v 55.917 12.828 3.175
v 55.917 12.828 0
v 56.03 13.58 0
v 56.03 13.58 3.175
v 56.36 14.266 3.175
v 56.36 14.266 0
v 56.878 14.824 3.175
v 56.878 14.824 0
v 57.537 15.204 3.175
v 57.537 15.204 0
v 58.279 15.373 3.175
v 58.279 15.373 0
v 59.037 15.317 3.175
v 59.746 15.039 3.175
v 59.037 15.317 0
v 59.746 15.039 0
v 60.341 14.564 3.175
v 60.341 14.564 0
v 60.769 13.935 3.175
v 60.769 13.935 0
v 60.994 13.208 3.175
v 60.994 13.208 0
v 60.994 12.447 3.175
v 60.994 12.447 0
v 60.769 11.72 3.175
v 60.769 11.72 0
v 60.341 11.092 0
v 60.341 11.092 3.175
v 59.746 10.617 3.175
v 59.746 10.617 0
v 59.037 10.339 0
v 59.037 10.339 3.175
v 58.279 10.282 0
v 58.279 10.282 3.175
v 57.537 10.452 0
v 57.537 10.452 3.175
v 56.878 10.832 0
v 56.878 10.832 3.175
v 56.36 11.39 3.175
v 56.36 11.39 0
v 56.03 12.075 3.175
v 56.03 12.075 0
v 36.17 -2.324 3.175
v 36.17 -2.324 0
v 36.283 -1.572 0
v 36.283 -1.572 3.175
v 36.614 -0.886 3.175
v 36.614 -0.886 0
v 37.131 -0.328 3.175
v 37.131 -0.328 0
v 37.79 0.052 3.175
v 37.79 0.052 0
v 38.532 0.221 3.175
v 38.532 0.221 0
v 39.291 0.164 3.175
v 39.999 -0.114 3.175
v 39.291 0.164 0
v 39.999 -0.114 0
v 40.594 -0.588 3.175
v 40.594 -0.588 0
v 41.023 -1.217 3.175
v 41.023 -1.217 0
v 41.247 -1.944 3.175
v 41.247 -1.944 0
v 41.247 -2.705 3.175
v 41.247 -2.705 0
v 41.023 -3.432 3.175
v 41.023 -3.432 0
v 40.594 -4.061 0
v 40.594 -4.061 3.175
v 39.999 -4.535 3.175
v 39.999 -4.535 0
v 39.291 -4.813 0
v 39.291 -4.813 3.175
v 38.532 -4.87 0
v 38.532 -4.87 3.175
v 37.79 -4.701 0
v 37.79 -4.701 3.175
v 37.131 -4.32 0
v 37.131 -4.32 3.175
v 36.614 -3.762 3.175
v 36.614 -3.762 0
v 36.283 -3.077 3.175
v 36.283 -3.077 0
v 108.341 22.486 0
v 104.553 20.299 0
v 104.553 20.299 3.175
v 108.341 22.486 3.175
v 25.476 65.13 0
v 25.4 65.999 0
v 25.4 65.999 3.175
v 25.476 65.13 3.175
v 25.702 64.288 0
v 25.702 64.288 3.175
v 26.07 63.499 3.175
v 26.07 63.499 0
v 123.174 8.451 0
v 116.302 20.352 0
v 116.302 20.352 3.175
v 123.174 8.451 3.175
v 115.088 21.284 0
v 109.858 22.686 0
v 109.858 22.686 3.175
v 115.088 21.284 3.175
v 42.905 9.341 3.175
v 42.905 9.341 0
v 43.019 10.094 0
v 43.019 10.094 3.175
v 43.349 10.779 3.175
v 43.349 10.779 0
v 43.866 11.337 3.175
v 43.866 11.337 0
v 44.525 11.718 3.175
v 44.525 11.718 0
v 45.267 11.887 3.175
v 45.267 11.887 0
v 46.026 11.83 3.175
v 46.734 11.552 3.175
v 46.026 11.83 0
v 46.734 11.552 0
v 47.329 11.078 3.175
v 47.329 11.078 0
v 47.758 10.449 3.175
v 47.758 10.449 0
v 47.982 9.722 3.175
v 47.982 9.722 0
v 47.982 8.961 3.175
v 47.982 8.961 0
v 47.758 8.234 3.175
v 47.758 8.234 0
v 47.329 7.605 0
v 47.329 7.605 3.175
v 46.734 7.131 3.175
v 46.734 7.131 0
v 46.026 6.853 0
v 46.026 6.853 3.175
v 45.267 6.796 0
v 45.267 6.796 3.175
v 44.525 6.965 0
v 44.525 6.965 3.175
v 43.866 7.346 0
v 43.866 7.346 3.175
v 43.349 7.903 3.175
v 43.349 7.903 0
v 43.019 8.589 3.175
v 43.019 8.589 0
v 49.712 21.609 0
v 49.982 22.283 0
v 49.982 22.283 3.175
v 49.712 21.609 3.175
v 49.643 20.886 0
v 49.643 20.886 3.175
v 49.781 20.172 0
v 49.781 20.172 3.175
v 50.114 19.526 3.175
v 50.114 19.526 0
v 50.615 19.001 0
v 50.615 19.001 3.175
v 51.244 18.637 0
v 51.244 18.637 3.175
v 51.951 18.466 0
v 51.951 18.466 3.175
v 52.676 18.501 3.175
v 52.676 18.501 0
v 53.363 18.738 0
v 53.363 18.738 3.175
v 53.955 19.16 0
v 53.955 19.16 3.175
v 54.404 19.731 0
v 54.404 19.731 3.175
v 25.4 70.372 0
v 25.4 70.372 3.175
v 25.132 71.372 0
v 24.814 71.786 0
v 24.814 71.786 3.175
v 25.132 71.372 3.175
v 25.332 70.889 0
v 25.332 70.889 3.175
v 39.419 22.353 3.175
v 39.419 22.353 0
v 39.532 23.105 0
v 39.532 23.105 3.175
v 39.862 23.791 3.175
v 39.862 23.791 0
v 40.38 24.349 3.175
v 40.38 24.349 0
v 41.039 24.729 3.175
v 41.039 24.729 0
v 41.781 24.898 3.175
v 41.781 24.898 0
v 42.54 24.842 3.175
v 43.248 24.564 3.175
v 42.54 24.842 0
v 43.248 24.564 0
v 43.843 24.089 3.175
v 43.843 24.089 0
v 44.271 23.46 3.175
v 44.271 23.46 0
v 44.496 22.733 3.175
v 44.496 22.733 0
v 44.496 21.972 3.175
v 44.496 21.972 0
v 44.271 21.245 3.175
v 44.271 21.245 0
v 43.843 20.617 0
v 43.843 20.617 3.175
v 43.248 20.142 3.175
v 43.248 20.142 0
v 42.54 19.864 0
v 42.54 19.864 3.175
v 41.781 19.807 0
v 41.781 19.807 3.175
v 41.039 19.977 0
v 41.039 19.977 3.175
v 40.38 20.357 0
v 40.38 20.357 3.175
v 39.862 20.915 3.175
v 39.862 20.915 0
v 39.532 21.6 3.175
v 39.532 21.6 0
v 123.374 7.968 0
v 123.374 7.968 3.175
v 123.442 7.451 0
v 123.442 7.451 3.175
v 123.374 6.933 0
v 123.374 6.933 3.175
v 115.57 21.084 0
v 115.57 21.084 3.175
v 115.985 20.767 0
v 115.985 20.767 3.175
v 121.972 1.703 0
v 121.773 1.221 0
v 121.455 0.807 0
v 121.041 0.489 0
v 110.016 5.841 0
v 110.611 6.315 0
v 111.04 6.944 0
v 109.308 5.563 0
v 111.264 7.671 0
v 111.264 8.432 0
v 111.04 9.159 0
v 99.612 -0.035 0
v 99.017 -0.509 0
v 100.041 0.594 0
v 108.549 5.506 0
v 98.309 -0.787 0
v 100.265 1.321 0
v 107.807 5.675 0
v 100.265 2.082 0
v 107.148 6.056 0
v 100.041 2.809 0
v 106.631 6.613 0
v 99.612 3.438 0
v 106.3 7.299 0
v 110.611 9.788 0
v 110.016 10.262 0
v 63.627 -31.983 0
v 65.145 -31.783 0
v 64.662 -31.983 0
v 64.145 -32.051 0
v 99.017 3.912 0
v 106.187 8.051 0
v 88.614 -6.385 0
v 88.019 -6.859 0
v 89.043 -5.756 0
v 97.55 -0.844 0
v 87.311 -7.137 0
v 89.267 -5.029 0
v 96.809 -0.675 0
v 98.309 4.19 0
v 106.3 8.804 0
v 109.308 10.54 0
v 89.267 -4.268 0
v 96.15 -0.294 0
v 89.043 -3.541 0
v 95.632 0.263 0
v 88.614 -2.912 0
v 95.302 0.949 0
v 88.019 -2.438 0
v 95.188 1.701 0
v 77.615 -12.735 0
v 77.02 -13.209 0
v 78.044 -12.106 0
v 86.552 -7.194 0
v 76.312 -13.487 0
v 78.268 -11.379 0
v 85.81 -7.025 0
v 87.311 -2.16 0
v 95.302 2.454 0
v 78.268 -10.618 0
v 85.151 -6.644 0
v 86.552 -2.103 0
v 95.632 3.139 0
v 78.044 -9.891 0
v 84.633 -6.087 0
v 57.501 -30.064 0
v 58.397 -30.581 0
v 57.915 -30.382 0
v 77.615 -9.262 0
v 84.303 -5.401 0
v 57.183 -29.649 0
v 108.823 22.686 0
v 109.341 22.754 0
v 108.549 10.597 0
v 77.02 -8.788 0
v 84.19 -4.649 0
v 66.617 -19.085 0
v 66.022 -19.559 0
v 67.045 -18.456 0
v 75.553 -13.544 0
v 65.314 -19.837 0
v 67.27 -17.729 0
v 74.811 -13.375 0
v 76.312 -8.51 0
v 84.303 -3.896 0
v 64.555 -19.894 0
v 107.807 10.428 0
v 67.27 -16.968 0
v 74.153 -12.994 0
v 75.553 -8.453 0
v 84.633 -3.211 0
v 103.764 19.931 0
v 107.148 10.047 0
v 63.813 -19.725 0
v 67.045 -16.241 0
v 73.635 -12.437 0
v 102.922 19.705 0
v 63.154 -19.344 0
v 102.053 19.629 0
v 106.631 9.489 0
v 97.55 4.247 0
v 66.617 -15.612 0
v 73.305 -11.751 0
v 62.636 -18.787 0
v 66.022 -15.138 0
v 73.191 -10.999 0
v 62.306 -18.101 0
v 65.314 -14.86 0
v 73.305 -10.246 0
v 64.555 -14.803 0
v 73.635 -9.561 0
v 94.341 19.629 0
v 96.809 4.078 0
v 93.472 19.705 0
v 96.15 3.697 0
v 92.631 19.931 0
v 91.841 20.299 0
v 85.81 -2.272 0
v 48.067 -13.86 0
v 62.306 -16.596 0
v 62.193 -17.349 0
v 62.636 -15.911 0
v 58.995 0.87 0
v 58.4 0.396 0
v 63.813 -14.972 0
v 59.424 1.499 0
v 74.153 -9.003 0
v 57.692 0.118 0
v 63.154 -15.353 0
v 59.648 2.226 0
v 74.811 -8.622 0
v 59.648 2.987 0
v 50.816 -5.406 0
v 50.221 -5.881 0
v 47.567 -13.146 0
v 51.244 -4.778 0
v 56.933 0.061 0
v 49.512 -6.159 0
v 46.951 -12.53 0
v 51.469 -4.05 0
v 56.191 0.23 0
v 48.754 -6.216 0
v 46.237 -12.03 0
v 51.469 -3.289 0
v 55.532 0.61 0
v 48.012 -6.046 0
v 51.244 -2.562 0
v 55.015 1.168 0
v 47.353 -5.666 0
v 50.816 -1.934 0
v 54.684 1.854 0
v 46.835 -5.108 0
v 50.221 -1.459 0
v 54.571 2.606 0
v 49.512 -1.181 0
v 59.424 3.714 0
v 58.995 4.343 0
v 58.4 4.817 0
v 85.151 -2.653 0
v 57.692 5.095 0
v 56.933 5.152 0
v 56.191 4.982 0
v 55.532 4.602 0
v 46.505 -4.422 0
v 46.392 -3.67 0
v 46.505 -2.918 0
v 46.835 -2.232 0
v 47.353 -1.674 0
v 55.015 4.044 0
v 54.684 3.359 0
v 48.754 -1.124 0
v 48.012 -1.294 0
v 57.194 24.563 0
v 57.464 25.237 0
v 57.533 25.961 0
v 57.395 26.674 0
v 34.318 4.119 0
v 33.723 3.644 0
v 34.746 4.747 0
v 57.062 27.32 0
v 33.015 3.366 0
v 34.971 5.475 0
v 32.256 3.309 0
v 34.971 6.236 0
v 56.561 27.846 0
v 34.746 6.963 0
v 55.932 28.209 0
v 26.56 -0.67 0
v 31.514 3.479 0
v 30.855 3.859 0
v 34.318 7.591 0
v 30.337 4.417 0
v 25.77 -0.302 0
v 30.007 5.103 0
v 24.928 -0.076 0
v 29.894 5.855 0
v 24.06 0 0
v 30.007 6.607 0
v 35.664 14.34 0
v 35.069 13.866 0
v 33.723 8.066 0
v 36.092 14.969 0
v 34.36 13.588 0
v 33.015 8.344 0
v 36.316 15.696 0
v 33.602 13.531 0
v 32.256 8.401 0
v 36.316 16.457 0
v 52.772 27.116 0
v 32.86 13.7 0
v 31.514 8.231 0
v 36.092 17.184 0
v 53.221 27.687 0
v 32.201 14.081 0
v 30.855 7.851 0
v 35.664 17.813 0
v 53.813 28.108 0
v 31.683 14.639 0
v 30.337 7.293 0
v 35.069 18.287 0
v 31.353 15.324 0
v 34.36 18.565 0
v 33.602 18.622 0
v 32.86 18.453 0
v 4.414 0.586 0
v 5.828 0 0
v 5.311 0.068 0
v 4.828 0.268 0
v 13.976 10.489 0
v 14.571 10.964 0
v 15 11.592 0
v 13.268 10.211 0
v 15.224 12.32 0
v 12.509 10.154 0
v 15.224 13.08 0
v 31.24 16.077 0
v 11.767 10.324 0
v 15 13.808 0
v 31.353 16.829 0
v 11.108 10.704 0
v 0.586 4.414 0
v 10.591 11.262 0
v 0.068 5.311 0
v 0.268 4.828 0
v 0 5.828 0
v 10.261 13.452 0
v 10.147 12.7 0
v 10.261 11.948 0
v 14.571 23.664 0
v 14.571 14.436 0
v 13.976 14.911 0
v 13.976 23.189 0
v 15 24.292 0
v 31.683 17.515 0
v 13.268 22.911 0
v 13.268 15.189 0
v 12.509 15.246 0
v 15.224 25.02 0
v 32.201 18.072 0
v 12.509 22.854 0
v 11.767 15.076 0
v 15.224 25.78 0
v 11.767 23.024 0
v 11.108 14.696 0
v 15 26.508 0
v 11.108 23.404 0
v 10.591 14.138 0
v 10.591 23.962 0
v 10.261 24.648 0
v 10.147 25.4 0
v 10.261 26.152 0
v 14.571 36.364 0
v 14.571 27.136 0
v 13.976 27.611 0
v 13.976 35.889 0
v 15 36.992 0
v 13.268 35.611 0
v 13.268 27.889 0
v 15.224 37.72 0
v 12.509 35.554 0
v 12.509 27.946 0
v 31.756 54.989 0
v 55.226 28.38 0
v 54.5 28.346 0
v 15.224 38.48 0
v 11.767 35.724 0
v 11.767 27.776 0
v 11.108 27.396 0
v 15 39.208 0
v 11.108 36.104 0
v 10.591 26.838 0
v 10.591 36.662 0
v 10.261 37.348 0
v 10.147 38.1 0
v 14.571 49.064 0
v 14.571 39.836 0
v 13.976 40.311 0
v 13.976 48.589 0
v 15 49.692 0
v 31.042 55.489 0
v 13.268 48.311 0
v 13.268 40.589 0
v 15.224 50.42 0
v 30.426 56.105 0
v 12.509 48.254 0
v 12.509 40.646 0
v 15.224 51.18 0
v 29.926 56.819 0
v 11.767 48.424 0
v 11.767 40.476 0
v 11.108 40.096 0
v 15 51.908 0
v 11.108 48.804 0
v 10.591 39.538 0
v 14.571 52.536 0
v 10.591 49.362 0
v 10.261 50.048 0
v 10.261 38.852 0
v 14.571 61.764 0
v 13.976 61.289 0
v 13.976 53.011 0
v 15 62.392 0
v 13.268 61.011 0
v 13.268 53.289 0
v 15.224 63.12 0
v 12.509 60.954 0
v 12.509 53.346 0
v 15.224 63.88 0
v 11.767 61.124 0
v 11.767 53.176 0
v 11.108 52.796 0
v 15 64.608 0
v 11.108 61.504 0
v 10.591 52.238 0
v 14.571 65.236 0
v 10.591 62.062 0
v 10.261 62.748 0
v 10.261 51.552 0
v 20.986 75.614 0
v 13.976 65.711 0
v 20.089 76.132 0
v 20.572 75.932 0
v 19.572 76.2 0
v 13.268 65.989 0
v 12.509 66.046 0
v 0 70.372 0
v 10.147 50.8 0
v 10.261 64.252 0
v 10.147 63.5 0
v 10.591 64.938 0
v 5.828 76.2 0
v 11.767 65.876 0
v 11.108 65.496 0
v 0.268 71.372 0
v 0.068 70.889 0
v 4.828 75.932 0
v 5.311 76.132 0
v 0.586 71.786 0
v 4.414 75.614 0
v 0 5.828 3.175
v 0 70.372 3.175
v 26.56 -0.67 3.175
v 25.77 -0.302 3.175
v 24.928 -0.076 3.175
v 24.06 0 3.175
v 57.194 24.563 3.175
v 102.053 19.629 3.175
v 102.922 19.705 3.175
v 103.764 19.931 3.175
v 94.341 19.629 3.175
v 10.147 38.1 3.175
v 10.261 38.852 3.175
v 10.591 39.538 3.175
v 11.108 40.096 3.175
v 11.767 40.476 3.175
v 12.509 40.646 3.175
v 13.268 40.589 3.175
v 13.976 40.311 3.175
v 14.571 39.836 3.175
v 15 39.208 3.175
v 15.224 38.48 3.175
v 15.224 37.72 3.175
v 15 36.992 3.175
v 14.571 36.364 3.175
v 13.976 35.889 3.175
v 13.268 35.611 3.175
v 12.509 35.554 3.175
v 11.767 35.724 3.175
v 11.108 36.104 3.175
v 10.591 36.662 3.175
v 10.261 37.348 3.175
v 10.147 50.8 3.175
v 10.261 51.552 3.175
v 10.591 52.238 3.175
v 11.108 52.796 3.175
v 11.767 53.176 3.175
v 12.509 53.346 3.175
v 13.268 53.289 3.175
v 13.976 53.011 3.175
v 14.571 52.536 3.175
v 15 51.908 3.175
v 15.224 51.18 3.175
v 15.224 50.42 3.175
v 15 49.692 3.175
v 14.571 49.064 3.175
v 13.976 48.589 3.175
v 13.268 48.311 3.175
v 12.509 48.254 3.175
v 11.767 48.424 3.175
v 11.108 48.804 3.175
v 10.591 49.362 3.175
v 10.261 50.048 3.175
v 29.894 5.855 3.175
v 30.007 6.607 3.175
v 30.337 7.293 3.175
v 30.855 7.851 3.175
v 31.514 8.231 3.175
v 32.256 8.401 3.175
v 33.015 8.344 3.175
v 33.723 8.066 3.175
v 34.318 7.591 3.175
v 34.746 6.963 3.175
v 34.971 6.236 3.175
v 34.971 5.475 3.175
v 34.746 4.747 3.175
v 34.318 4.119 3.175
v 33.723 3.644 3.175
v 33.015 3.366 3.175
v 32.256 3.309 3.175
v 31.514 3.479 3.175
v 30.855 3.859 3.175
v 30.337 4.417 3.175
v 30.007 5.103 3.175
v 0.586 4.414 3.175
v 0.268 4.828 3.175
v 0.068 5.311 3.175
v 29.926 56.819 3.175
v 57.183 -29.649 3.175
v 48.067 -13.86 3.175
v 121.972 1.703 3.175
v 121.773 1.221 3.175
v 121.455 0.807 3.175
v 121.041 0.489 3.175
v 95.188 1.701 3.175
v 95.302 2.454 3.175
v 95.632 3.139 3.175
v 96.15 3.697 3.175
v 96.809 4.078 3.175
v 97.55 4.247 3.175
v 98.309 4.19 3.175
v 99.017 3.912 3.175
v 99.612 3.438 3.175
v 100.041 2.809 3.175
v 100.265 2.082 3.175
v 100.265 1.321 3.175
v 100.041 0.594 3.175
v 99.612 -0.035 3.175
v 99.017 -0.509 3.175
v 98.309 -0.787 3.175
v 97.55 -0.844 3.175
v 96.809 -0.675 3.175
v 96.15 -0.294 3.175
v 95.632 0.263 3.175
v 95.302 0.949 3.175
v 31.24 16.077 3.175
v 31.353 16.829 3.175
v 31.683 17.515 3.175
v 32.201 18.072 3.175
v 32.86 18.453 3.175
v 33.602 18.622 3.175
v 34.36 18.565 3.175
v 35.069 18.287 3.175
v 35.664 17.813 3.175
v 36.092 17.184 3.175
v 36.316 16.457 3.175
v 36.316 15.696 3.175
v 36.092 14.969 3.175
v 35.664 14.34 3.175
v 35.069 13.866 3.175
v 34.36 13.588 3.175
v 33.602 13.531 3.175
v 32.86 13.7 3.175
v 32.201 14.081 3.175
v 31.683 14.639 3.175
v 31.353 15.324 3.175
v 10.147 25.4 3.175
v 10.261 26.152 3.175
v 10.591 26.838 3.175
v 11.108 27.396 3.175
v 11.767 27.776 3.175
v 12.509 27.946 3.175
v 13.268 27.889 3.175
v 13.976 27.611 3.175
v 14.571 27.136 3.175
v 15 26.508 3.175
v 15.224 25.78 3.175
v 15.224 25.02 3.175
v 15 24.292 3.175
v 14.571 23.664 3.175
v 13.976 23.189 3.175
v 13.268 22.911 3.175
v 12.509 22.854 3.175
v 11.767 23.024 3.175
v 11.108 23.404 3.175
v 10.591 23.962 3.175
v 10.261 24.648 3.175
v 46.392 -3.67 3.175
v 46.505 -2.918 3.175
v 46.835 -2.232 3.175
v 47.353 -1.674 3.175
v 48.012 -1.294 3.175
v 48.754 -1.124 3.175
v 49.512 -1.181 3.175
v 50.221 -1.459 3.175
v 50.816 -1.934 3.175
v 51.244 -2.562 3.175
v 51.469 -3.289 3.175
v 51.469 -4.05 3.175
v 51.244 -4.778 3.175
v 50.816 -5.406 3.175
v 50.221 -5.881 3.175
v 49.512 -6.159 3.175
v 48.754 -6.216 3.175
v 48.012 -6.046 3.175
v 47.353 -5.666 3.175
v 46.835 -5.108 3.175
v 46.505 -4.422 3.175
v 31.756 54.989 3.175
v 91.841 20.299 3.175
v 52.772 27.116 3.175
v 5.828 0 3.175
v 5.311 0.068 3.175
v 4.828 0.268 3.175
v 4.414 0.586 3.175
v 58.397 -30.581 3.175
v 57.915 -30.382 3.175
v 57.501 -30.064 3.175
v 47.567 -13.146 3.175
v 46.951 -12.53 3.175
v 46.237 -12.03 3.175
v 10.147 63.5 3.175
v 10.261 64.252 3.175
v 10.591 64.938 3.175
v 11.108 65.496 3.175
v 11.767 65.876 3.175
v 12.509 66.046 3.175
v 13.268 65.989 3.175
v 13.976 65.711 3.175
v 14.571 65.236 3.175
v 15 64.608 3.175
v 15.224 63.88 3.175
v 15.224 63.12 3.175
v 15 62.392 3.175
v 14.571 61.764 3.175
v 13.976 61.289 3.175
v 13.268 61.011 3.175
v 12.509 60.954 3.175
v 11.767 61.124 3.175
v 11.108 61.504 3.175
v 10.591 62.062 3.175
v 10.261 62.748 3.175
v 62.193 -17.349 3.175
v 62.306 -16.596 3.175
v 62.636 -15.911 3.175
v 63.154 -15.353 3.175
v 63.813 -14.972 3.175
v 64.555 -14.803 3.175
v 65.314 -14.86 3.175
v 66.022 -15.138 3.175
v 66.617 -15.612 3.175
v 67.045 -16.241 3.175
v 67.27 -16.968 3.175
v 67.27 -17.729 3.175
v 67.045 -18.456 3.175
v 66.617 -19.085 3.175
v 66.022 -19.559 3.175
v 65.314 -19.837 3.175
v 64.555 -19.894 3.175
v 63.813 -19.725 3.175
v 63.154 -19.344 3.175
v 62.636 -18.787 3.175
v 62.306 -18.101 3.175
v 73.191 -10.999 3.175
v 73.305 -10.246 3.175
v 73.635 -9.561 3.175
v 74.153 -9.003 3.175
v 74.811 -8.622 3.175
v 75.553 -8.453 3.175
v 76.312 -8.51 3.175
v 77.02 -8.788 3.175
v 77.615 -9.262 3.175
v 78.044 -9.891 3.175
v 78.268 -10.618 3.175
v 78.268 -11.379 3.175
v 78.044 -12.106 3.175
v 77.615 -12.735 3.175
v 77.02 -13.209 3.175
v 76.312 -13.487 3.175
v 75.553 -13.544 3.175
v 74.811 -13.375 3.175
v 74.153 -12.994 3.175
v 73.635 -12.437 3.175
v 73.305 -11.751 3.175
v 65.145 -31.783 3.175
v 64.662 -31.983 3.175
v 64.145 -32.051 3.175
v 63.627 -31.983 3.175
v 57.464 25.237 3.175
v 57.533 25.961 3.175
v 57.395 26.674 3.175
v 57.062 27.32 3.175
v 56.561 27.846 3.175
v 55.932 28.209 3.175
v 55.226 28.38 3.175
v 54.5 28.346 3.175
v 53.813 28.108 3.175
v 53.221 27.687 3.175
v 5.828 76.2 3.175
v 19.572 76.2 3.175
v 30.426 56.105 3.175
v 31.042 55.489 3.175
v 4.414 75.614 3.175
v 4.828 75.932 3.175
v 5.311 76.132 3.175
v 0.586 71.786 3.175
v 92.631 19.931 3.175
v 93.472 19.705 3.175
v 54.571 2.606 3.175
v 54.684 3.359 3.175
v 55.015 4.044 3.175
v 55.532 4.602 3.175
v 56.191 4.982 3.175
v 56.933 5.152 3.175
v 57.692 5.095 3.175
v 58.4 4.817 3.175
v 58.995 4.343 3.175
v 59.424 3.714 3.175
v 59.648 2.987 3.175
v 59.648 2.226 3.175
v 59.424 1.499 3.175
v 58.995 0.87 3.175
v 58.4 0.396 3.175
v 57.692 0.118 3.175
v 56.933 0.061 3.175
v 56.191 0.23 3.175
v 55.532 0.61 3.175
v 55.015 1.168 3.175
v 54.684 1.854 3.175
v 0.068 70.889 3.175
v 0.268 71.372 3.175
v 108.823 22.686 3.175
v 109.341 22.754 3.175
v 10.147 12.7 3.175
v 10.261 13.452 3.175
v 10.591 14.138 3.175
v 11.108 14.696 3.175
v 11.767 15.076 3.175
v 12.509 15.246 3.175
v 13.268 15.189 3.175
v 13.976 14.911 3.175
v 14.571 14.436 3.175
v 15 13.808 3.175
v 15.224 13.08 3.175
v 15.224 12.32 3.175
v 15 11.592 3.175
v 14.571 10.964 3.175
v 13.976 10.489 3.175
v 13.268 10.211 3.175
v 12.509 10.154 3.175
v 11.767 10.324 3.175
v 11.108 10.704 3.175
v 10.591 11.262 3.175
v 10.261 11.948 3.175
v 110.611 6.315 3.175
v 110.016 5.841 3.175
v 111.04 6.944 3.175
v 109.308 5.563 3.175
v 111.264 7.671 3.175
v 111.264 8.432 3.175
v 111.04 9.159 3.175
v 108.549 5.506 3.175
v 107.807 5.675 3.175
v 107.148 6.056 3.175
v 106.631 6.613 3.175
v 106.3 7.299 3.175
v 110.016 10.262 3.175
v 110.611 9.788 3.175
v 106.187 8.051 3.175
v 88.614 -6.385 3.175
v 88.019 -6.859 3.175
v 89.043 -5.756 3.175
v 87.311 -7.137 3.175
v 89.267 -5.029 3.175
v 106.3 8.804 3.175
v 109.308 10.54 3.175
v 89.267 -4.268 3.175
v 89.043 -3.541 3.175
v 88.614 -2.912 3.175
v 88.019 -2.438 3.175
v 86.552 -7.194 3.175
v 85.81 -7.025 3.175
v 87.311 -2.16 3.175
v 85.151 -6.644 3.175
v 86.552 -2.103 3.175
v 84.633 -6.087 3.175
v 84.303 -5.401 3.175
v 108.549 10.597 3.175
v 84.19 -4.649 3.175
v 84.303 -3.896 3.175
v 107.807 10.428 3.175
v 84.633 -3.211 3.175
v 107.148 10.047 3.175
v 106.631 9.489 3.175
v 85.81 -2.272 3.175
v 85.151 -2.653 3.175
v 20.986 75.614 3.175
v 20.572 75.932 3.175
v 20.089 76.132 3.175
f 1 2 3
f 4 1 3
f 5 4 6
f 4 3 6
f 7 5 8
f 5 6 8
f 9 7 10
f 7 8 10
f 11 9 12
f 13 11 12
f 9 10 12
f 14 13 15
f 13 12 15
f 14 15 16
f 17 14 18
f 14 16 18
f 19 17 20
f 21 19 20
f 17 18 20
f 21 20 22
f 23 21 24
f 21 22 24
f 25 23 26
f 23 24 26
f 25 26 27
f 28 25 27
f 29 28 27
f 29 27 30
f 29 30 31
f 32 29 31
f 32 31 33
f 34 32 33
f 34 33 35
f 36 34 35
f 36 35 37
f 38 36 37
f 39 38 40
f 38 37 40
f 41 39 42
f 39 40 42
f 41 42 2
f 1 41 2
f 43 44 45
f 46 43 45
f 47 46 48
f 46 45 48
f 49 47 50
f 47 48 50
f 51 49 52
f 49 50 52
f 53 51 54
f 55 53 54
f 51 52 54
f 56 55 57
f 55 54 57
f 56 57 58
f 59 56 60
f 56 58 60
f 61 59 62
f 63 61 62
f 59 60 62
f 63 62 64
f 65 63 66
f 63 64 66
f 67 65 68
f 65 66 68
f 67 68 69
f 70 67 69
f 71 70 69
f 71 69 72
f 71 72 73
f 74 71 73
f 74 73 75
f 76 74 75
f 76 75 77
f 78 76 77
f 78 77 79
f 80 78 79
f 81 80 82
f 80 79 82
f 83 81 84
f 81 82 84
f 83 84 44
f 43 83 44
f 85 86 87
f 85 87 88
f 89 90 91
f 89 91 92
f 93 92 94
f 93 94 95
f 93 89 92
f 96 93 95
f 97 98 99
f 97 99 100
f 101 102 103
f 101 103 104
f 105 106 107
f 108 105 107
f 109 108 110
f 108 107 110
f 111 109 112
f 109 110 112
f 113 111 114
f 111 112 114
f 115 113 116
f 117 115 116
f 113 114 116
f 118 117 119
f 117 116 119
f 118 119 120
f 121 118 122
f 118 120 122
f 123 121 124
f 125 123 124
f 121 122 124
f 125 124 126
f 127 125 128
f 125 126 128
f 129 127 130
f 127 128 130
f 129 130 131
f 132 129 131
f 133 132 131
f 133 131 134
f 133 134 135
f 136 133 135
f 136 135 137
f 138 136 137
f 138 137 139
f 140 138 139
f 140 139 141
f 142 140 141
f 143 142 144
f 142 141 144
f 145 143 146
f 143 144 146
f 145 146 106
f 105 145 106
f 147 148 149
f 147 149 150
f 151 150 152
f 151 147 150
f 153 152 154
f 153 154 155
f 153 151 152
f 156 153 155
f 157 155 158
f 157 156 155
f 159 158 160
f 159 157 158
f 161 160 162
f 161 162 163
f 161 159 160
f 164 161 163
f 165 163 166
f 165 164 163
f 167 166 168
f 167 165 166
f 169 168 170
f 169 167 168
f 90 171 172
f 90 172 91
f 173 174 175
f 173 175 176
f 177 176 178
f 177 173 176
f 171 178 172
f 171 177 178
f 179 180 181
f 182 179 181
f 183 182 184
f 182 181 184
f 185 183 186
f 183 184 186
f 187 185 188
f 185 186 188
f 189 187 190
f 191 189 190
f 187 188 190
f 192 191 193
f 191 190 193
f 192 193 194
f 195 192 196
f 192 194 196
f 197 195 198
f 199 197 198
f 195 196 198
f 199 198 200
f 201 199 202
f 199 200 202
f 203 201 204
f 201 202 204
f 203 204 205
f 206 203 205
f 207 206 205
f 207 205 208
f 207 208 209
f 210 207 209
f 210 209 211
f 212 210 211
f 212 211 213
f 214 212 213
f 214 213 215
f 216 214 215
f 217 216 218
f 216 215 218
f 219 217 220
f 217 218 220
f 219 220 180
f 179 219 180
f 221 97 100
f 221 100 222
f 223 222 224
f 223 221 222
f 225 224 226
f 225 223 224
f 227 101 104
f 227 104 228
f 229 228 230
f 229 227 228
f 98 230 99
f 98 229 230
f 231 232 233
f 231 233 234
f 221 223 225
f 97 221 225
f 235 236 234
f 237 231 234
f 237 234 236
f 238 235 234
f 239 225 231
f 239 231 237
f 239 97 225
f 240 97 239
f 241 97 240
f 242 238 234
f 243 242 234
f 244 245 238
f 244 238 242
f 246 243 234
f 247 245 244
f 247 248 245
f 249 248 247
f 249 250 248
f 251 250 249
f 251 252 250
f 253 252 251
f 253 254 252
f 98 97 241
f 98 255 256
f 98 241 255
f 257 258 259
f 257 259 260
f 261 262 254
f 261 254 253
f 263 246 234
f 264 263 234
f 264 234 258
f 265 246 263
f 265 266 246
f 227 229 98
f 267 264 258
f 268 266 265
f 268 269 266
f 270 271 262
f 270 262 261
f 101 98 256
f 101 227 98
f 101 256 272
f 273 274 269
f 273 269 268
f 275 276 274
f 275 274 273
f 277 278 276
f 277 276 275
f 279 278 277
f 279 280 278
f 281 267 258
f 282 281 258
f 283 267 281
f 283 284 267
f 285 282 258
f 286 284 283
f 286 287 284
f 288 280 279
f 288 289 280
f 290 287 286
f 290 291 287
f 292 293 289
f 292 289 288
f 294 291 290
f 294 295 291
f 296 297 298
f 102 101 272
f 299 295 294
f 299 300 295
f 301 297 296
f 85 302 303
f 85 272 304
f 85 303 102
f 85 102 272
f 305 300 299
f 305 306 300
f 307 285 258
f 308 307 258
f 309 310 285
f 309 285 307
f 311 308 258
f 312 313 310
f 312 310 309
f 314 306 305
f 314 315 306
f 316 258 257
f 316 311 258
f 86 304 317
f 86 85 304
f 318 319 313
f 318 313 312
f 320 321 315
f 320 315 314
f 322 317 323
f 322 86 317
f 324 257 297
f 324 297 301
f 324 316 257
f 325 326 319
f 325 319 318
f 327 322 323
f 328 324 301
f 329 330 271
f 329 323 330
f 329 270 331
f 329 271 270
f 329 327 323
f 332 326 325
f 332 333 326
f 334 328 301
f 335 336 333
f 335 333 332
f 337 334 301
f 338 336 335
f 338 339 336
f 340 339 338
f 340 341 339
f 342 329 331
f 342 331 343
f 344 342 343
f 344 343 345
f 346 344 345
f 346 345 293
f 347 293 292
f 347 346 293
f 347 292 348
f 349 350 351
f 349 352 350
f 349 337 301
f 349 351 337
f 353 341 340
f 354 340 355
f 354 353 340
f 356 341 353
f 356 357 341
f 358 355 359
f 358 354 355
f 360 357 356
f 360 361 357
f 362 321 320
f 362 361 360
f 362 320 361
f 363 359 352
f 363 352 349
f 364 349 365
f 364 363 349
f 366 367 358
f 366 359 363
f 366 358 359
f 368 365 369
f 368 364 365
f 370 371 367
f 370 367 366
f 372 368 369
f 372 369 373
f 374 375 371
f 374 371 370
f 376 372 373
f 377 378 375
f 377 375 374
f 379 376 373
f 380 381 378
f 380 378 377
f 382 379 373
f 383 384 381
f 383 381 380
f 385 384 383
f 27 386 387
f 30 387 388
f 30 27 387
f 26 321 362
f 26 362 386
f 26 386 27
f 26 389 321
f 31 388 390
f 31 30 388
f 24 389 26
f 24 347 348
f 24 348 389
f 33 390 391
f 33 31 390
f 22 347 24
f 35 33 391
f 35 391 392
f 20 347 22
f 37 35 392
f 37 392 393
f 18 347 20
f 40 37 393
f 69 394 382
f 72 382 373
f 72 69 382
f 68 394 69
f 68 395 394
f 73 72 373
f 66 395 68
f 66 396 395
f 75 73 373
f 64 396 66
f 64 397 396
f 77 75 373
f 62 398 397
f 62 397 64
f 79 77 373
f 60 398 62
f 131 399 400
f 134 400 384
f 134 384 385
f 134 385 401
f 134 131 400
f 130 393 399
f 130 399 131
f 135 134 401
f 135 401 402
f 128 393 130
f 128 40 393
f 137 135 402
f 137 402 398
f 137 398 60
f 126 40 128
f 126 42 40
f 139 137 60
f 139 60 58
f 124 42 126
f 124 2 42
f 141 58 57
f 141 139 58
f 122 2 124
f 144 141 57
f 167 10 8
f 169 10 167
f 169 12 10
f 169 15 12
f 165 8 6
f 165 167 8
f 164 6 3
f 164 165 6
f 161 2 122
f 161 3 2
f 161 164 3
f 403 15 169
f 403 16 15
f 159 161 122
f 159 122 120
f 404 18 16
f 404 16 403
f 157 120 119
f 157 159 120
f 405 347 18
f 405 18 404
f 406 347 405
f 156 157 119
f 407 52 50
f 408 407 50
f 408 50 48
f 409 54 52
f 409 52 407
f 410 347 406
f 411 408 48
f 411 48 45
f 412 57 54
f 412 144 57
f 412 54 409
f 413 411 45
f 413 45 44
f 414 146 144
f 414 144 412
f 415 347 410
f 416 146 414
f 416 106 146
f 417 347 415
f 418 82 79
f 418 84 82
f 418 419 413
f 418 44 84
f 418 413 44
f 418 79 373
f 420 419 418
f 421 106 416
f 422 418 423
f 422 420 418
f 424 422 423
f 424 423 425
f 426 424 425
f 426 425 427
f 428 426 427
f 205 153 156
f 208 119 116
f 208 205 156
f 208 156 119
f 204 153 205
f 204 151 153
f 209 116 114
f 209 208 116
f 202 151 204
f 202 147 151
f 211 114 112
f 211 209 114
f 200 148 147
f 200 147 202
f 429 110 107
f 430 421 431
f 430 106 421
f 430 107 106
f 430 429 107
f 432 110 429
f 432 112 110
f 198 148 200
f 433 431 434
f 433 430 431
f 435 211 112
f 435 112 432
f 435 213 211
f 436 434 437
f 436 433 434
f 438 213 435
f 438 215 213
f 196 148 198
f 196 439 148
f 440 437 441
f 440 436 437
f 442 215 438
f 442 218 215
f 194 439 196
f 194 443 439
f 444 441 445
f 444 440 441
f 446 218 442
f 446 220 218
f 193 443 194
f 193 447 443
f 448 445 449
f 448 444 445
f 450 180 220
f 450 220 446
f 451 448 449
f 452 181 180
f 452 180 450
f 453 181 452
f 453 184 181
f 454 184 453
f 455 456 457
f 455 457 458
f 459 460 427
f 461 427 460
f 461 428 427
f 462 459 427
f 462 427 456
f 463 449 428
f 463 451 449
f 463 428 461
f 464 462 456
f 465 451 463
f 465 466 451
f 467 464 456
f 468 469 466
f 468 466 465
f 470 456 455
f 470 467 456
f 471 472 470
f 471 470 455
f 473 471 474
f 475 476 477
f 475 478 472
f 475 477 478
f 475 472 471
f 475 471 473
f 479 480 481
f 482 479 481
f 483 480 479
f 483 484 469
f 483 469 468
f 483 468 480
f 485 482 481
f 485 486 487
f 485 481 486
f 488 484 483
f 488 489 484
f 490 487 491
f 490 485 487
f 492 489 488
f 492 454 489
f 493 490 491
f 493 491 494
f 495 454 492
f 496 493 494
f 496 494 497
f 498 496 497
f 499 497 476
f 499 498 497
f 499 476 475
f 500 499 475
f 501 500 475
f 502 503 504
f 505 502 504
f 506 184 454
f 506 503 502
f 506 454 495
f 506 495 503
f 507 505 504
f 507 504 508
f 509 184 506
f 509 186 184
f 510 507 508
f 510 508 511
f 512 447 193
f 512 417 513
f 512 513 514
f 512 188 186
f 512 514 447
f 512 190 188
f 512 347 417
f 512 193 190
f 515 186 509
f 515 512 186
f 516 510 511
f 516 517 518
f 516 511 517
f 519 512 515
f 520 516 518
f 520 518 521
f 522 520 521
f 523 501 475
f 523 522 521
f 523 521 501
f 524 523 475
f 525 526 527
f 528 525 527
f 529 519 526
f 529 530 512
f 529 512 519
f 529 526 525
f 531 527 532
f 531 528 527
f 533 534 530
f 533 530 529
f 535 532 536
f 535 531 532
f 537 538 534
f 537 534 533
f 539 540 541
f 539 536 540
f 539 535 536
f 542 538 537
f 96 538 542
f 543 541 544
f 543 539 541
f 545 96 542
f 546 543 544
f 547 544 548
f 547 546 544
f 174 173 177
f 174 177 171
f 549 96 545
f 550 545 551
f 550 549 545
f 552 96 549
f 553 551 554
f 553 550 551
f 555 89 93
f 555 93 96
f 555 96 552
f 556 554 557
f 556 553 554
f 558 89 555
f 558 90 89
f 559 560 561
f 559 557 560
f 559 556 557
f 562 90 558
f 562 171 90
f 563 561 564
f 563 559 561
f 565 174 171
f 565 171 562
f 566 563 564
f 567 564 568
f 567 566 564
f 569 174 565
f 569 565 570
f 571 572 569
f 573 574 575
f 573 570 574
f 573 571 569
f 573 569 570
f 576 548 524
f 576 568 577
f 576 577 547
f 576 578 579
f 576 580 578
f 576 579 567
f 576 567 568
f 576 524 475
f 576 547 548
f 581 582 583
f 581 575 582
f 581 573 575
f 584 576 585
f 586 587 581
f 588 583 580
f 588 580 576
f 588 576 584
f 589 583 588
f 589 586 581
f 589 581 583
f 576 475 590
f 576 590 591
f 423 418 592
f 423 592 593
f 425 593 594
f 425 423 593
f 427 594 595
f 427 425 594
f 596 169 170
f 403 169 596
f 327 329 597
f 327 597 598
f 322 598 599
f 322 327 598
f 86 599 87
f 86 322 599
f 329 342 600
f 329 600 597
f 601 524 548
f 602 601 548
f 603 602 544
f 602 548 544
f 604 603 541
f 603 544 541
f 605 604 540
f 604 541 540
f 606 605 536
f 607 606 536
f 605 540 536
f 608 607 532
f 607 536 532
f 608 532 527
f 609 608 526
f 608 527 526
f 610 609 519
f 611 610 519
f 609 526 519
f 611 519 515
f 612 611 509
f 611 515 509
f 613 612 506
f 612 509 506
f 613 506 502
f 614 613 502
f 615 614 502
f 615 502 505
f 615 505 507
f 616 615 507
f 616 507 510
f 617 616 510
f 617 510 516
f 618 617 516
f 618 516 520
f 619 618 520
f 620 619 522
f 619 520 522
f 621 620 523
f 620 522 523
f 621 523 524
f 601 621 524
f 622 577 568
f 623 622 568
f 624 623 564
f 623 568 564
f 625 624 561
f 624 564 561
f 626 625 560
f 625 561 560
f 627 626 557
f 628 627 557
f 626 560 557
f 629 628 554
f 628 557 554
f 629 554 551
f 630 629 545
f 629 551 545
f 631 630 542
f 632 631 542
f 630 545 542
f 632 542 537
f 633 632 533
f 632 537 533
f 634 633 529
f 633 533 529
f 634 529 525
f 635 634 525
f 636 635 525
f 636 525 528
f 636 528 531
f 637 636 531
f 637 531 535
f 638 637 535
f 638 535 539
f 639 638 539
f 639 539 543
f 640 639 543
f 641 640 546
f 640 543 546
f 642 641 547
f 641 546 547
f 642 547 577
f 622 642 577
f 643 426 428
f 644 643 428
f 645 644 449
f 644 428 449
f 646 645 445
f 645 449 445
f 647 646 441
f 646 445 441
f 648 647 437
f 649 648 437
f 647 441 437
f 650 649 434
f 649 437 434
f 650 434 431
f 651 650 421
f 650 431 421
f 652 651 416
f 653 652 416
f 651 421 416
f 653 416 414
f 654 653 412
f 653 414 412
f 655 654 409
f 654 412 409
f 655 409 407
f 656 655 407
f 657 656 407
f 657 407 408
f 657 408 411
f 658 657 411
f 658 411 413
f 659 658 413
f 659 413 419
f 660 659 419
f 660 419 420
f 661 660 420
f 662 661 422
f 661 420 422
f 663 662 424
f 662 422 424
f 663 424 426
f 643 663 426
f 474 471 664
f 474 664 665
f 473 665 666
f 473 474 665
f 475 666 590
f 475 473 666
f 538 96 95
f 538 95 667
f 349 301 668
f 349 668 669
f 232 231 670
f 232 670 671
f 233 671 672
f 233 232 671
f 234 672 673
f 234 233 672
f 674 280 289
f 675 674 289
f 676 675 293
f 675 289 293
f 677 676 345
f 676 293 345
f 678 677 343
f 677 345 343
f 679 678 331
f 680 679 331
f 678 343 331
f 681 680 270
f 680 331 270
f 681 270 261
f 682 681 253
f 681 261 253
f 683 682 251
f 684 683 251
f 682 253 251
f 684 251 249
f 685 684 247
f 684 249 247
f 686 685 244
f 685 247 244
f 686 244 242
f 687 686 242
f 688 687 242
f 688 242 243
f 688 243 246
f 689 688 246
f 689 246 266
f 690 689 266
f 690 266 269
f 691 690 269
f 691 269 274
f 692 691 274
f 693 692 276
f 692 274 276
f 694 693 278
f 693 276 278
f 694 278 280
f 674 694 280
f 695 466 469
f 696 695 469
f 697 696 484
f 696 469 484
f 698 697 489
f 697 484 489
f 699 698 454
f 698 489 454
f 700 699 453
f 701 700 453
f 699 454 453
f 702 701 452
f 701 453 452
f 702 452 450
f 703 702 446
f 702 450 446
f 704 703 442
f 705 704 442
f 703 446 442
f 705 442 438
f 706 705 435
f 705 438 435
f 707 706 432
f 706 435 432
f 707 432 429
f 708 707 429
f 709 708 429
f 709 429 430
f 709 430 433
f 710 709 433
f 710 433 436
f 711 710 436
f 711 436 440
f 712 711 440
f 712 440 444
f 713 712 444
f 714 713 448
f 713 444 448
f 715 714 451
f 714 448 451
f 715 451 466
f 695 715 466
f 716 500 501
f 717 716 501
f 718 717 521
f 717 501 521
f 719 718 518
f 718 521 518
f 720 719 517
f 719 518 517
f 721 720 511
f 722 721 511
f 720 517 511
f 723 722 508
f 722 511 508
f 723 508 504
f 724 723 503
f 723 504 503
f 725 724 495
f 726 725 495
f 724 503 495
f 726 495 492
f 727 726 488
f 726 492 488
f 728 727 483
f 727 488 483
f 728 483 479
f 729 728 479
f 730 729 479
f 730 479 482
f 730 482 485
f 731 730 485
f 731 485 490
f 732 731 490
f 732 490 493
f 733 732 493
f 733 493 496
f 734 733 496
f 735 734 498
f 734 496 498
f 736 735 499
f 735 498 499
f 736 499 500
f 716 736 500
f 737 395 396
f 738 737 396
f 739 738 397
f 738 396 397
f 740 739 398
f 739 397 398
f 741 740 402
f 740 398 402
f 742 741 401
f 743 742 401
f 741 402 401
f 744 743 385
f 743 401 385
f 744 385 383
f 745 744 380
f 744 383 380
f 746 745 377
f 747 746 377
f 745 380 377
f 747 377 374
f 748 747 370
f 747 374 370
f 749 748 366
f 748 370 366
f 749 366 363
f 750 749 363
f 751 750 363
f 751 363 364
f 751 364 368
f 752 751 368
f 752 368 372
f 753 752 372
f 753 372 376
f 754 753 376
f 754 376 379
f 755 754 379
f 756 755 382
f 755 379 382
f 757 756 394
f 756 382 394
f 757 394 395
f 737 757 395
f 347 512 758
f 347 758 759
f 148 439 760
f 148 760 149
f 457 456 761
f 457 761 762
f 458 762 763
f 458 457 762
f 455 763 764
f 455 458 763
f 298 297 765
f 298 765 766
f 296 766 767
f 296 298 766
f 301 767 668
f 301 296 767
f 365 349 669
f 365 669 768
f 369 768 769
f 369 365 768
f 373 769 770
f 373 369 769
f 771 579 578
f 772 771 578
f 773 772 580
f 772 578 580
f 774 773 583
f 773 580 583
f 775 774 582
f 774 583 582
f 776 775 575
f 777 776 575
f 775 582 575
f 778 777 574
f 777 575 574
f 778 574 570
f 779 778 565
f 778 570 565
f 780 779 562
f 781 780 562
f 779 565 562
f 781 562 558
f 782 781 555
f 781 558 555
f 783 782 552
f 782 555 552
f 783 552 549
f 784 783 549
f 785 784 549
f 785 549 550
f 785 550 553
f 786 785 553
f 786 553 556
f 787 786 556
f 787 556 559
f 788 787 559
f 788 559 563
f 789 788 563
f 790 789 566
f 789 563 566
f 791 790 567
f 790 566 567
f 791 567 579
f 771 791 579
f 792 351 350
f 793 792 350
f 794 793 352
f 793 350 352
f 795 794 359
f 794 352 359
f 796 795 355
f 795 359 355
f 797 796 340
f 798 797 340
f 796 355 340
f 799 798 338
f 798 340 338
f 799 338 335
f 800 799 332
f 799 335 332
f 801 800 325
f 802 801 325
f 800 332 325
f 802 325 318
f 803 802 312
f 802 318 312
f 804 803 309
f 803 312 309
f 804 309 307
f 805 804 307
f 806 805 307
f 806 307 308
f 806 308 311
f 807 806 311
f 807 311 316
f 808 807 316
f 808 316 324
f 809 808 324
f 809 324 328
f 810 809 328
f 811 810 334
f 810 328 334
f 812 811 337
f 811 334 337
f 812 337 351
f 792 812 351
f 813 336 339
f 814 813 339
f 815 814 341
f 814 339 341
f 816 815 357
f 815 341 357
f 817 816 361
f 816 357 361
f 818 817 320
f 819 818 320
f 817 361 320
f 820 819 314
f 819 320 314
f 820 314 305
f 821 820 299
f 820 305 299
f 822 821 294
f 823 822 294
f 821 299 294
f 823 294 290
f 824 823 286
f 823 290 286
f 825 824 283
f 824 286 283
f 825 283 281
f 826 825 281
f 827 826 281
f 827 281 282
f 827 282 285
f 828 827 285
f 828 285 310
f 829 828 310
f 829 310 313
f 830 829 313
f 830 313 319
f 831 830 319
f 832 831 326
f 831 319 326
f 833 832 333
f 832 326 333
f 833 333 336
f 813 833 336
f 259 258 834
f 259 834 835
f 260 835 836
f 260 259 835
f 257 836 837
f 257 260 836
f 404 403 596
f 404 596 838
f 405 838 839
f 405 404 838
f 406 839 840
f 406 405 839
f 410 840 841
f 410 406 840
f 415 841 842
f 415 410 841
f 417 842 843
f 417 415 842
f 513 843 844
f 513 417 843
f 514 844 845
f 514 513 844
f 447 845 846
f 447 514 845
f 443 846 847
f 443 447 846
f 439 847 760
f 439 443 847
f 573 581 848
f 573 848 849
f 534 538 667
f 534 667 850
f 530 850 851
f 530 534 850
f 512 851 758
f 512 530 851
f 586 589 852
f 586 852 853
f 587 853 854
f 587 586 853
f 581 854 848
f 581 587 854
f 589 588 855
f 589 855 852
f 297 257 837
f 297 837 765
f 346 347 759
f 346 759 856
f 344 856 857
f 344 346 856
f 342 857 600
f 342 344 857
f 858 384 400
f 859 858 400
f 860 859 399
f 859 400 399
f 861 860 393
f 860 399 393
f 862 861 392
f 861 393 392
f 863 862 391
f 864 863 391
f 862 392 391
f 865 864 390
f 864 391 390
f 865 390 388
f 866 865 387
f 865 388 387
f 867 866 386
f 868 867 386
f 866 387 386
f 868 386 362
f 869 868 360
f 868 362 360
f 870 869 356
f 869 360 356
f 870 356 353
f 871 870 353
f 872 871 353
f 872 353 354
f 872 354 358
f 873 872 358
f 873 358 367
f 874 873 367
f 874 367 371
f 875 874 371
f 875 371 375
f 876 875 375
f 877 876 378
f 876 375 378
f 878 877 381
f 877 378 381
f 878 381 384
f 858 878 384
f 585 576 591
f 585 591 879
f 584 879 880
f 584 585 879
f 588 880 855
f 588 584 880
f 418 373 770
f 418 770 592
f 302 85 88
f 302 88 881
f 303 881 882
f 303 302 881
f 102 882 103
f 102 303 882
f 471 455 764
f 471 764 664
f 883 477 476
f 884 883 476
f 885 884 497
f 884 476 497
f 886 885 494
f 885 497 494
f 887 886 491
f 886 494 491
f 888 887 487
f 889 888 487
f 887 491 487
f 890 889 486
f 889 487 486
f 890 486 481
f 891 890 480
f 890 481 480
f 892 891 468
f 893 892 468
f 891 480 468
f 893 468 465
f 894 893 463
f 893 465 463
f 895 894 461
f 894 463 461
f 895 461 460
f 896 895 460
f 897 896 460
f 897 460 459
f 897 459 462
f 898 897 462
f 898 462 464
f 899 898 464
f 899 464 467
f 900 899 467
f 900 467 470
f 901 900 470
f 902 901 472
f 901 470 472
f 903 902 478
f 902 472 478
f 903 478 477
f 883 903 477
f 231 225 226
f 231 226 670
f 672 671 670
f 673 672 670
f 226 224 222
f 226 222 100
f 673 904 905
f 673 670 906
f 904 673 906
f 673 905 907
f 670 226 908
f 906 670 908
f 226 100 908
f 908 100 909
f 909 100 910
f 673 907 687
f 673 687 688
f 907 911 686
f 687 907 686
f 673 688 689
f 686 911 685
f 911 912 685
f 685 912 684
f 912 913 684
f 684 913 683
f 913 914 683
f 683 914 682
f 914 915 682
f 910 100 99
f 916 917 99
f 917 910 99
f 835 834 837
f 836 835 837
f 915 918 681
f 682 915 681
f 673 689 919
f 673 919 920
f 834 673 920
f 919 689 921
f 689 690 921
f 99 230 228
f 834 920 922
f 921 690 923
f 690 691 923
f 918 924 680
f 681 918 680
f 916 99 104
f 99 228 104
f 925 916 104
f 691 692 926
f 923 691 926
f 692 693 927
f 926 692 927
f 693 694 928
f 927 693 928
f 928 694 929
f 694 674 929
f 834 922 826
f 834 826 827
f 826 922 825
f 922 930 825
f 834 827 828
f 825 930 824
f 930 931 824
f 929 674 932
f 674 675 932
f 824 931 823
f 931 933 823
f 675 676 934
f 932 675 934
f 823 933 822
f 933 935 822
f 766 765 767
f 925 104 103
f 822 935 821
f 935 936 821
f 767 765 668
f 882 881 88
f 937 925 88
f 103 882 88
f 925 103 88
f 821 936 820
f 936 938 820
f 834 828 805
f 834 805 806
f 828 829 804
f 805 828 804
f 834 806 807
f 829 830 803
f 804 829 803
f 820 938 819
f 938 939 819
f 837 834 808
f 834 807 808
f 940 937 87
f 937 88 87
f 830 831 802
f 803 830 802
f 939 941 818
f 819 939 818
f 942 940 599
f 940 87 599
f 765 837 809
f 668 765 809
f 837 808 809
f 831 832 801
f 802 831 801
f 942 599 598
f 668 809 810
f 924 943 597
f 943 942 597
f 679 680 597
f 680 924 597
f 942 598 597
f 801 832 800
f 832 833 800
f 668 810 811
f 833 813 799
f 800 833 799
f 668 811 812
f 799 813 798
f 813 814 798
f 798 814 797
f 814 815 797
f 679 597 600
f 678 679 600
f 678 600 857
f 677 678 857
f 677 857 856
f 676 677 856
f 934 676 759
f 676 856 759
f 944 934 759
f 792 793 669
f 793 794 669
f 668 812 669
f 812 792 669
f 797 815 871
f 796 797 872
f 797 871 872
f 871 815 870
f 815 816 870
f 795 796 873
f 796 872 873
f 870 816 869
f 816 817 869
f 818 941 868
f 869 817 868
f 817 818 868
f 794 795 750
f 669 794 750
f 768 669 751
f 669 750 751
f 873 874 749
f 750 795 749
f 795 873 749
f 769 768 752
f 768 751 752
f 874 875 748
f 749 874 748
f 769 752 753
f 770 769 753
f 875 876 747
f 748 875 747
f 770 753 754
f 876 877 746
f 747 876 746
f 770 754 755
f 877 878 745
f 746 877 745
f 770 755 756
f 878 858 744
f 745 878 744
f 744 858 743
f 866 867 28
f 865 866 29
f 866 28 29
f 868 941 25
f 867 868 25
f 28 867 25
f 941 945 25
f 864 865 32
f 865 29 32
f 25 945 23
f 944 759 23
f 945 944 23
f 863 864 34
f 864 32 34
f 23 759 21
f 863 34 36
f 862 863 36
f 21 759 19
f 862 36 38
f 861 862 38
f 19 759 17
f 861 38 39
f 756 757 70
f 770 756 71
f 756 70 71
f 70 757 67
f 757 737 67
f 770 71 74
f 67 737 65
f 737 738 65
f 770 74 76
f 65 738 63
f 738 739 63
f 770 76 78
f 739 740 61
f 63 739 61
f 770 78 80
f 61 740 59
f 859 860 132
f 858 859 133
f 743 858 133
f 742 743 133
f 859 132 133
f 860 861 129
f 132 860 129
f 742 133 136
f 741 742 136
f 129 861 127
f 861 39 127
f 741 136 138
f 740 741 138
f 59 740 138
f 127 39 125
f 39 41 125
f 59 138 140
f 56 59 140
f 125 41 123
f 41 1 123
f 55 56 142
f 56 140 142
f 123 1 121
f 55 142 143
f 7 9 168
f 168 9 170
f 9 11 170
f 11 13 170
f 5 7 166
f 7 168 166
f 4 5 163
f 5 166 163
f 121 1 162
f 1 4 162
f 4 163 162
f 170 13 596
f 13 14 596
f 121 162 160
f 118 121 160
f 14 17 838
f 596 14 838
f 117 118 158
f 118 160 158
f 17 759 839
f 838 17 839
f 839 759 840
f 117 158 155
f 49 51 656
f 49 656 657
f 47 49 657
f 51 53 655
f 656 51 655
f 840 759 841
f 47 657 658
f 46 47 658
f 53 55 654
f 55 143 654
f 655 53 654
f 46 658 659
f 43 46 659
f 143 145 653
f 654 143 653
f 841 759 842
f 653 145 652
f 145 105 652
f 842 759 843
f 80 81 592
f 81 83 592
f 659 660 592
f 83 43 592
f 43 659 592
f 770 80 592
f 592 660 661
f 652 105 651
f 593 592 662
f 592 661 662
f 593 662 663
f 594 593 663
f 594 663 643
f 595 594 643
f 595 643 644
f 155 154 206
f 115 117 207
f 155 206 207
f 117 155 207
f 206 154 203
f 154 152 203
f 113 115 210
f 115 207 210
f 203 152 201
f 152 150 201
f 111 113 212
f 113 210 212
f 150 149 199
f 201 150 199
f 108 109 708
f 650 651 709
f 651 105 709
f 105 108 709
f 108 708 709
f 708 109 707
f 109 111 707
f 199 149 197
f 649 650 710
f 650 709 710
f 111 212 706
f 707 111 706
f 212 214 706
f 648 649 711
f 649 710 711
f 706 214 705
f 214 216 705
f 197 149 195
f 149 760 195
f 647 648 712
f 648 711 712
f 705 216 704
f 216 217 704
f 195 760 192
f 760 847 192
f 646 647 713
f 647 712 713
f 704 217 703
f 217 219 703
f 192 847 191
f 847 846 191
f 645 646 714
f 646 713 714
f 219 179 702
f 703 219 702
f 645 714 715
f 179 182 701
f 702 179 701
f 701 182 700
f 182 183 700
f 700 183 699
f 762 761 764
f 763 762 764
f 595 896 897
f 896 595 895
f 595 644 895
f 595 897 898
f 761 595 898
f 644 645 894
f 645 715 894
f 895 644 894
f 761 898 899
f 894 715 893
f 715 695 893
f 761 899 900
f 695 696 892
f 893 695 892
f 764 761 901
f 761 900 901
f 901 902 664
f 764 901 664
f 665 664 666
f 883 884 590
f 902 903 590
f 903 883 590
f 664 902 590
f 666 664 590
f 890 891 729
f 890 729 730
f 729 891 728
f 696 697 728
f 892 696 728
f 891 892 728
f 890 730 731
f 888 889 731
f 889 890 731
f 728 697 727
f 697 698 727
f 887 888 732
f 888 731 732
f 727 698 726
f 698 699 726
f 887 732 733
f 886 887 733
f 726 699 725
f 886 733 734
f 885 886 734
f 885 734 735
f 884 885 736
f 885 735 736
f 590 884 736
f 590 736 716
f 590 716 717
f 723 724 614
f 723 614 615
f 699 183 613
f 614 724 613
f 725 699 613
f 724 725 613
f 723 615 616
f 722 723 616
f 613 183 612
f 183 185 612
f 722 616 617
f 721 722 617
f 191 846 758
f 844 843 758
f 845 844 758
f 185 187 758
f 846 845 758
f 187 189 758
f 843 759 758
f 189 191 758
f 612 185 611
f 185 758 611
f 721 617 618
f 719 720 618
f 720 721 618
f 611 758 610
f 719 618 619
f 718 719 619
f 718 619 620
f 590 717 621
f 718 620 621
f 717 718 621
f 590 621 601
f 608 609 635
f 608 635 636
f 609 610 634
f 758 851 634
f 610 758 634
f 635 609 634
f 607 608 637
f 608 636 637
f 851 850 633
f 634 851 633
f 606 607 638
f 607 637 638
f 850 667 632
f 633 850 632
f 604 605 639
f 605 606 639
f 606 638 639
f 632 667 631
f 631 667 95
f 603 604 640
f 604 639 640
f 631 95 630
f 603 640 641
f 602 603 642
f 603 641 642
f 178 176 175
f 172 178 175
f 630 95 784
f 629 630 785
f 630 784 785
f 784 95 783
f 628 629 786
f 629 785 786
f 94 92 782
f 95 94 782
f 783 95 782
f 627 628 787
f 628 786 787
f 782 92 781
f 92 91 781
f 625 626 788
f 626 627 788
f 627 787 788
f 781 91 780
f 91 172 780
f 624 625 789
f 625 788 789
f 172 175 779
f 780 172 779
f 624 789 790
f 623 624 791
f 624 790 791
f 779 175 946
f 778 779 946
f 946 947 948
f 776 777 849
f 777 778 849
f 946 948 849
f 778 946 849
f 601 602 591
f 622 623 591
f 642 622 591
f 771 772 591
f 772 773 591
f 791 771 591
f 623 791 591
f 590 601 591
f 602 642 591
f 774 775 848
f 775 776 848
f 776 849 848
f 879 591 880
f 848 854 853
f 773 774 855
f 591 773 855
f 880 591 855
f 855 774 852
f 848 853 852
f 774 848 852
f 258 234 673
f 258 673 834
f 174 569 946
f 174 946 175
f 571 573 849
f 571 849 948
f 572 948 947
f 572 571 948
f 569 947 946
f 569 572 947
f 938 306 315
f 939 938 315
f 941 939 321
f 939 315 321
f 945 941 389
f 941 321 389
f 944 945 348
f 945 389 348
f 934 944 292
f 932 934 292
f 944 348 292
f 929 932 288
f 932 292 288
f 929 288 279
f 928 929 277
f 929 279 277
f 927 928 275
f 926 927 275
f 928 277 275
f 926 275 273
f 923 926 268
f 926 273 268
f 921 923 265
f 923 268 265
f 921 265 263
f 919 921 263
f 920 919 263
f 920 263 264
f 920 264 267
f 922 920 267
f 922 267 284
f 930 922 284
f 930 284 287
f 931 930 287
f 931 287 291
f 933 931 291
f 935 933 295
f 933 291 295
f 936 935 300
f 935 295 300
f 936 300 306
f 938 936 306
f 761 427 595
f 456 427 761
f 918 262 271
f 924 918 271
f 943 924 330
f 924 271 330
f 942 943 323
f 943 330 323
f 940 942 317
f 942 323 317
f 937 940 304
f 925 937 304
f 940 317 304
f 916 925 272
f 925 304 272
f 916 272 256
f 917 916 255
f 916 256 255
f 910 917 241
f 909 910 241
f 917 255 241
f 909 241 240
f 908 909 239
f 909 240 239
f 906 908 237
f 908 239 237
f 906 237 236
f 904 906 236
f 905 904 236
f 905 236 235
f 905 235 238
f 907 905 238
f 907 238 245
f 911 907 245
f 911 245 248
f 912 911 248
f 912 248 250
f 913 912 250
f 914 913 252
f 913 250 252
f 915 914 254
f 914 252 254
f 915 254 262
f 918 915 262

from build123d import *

# Parameters (mm, degrees)
SKETCH1_R           = 2.5527
BOSS_EXTRUDE1_DEPTH = 3.175


with BuildPart() as part:
    # Sketch1 → Boss-Extrude1 (new body)
    with BuildSketch(Plane(origin=(0, 0, 0), x_dir=(-1, 0, 0), z_dir=(0, 0, -1))):
        with BuildLine():
            Line((-4.414213562, 0.585786438), (-0.585786438, 4.414213562))
            ThreePointArc((-0.585786438, 4.414213562), (-0.152240935, 5.06306026), (0, 5.828427125))
            Line((0, 5.828427125), (0, 70.371572875))
            ThreePointArc((0, 70.371572875), (-0.152240935, 71.13693974), (-0.585786438, 71.785786438))
            Line((-0.585786438, 71.785786438), (-4.414213562, 75.614213562))
            ThreePointArc((-4.414213562, 75.614213562), (-5.06306026, 76.047759065), (-5.828427125, 76.2))
            Line((-5.828427125, 76.2), (-19.571572875, 76.2))
            ThreePointArc((-19.571572875, 76.2), (-20.33693974, 76.047759065), (-20.985786438, 75.614213562))
            Line((-20.985786438, 75.614213562), (-24.814213562, 71.785786438))
            ThreePointArc((-24.814213562, 71.785786438), (-25.247759065, 71.13693974), (-25.4, 70.371572875))
            Line((-25.4, 70.371572875), (-25.4, 65.998533312))
            ThreePointArc((-25.4, 65.998533312), (-25.570370869, 64.704438086), (-26.069872981, 63.498533312))
            Line((-26.069872981, 63.498533312), (-29.926279442, 56.819041388))
            ThreePointArc((-29.926279442, 56.819041388), (-30.720872555, 55.783507482), (-31.756406461, 54.988914369))
            Line((-31.756406461, 54.988914369), (-91.840638796, 20.299266656))
            ThreePointArc((-91.840638796, 20.299266656), (-93.04654357, 19.799764543), (-94.340638796, 19.629393675))
            Line((-94.340638796, 19.629393675), (-102.053451717, 19.629393675))
            ThreePointArc((-102.053451717, 19.629393675), (-103.347546942, 19.799764543), (-104.553451717, 20.299266656))
            Line((-104.553451717, 20.299266656), (-108.34061507, 22.485786438))
            ThreePointArc((-108.34061507, 22.485786438), (-109.079562686, 22.736625353), (-109.858253161, 22.685587283))
            Line((-109.858253161, 22.685587283), (-115.08798187, 21.284285698))
            ThreePointArc((-115.08798187, 21.284285698), (-115.787866637, 20.939140726), (-116.302394587, 20.352434046))
            Line((-116.302394587, 20.352434046), (-123.173967462, 8.450520698))
            ThreePointArc((-123.173967462, 8.450520698), (-123.424806377, 7.711573082), (-123.373768307, 6.932882608))
            Line((-123.373768307, 6.932882608), (-121.972466723, 1.703153899))
            ThreePointArc((-121.972466723, 1.703153899), (-121.627321751, 1.003269131), (-121.04061507, 0.488741182))
            Line((-121.04061507, 0.488741182), (-65.14461121, -31.782831694))
            ThreePointArc((-65.14461121, -31.782831694), (-64.405663595, -32.033670609), (-63.62697312, -31.982632539))
            Line((-63.62697312, -31.982632539), (-58.397244411, -30.581330955))
            ThreePointArc((-58.397244411, -30.581330955), (-57.697359643, -30.236185983), (-57.182831694, -29.649479302))
            Line((-57.182831694, -29.649479302), (-48.066918237, -13.860254038))
            ThreePointArc((-48.066918237, -13.860254038), (-47.272325124, -12.824720132), (-46.236791218, -12.030127019))
            Line((-46.236791218, -12.030127019), (-26.560254038, -0.669872981))
            ThreePointArc((-26.560254038, -0.669872981), (-25.354349263, -0.170370869), (-24.060254038, 0))
            Line((-24.060254038, 0), (-5.828427125, 0))
            ThreePointArc((-5.828427125, 0), (-5.06306026, 0.152240935), (-4.414213562, 0.585786438))
        make_face()
        with Locations((-33.792281133, 16.076625677)):
            Circle(SKETCH1_R, mode=Mode.SUBTRACT)
        with Locations((-57.123670933, 2.606241495)):
            Circle(SKETCH1_R, mode=Mode.SUBTRACT)
        with Locations((-32.446584062, 5.855041615)):
            Circle(SKETCH1_R, mode=Mode.SUBTRACT)
        with Locations((-48.944368004, -3.669958385)):
            Circle(SKETCH1_R, mode=Mode.SUBTRACT)
        with Locations((-12.7, 12.7)):
            Circle(SKETCH1_R, mode=Mode.SUBTRACT)
        with Locations((-12.7, 38.1)):
            Circle(SKETCH1_R, mode=Mode.SUBTRACT)
        with Locations((-12.7, 63.5)):
            Circle(SKETCH1_R, mode=Mode.SUBTRACT)
        with Locations((-64.745567884, -17.348522628)):
            Circle(SKETCH1_R, mode=Mode.SUBTRACT)
        with Locations((-86.74261314, -4.648522628)):
            Circle(SKETCH1_R, mode=Mode.SUBTRACT)
        with Locations((-108.739658396, 8.051477372)):
            Circle(SKETCH1_R, mode=Mode.SUBTRACT)
        with Locations((-12.7, 25.4)):
            Circle(SKETCH1_R, mode=Mode.SUBTRACT)
        with Locations((-12.7, 50.8)):
            Circle(SKETCH1_R, mode=Mode.SUBTRACT)
        with Locations((-75.744090512, -10.998522628)):
            Circle(SKETCH1_R, mode=Mode.SUBTRACT)
        with Locations((-97.741135768, 1.701477372)):
            Circle(SKETCH1_R, mode=Mode.SUBTRACT)
        with Locations((-41.971584062, 22.352825557)):
            Circle(SKETCH1_R, mode=Mode.SUBTRACT)
        with Locations((-58.469368004, 12.827825557)):
            Circle(SKETCH1_R, mode=Mode.SUBTRACT)
        with Locations((-45.457976033, 9.341433586)):
            Circle(SKETCH1_R, mode=Mode.SUBTRACT)
        with Locations((-38.722783942, -2.324261314)):
            Circle(SKETCH1_R, mode=Mode.SUBTRACT)
        with BuildLine():
            Line((-54.403871172, 19.730778486), (-57.193679081, 24.562867528))
            ThreePointArc((-57.193679081, 24.562867528), (-56.259326033, 28.049920576), (-52.772272985, 27.115567528))
            Line((-52.772272985, 27.115567528), (-49.982465075, 22.283478486))
            ThreePointArc((-49.982465075, 22.283478486), (-50.916818124, 18.796425438), (-54.403871172, 19.730778486))
        make_face(mode=Mode.SUBTRACT)
    extrude(amount=-BOSS_EXTRUDE1_DEPTH)


solid = part.part
